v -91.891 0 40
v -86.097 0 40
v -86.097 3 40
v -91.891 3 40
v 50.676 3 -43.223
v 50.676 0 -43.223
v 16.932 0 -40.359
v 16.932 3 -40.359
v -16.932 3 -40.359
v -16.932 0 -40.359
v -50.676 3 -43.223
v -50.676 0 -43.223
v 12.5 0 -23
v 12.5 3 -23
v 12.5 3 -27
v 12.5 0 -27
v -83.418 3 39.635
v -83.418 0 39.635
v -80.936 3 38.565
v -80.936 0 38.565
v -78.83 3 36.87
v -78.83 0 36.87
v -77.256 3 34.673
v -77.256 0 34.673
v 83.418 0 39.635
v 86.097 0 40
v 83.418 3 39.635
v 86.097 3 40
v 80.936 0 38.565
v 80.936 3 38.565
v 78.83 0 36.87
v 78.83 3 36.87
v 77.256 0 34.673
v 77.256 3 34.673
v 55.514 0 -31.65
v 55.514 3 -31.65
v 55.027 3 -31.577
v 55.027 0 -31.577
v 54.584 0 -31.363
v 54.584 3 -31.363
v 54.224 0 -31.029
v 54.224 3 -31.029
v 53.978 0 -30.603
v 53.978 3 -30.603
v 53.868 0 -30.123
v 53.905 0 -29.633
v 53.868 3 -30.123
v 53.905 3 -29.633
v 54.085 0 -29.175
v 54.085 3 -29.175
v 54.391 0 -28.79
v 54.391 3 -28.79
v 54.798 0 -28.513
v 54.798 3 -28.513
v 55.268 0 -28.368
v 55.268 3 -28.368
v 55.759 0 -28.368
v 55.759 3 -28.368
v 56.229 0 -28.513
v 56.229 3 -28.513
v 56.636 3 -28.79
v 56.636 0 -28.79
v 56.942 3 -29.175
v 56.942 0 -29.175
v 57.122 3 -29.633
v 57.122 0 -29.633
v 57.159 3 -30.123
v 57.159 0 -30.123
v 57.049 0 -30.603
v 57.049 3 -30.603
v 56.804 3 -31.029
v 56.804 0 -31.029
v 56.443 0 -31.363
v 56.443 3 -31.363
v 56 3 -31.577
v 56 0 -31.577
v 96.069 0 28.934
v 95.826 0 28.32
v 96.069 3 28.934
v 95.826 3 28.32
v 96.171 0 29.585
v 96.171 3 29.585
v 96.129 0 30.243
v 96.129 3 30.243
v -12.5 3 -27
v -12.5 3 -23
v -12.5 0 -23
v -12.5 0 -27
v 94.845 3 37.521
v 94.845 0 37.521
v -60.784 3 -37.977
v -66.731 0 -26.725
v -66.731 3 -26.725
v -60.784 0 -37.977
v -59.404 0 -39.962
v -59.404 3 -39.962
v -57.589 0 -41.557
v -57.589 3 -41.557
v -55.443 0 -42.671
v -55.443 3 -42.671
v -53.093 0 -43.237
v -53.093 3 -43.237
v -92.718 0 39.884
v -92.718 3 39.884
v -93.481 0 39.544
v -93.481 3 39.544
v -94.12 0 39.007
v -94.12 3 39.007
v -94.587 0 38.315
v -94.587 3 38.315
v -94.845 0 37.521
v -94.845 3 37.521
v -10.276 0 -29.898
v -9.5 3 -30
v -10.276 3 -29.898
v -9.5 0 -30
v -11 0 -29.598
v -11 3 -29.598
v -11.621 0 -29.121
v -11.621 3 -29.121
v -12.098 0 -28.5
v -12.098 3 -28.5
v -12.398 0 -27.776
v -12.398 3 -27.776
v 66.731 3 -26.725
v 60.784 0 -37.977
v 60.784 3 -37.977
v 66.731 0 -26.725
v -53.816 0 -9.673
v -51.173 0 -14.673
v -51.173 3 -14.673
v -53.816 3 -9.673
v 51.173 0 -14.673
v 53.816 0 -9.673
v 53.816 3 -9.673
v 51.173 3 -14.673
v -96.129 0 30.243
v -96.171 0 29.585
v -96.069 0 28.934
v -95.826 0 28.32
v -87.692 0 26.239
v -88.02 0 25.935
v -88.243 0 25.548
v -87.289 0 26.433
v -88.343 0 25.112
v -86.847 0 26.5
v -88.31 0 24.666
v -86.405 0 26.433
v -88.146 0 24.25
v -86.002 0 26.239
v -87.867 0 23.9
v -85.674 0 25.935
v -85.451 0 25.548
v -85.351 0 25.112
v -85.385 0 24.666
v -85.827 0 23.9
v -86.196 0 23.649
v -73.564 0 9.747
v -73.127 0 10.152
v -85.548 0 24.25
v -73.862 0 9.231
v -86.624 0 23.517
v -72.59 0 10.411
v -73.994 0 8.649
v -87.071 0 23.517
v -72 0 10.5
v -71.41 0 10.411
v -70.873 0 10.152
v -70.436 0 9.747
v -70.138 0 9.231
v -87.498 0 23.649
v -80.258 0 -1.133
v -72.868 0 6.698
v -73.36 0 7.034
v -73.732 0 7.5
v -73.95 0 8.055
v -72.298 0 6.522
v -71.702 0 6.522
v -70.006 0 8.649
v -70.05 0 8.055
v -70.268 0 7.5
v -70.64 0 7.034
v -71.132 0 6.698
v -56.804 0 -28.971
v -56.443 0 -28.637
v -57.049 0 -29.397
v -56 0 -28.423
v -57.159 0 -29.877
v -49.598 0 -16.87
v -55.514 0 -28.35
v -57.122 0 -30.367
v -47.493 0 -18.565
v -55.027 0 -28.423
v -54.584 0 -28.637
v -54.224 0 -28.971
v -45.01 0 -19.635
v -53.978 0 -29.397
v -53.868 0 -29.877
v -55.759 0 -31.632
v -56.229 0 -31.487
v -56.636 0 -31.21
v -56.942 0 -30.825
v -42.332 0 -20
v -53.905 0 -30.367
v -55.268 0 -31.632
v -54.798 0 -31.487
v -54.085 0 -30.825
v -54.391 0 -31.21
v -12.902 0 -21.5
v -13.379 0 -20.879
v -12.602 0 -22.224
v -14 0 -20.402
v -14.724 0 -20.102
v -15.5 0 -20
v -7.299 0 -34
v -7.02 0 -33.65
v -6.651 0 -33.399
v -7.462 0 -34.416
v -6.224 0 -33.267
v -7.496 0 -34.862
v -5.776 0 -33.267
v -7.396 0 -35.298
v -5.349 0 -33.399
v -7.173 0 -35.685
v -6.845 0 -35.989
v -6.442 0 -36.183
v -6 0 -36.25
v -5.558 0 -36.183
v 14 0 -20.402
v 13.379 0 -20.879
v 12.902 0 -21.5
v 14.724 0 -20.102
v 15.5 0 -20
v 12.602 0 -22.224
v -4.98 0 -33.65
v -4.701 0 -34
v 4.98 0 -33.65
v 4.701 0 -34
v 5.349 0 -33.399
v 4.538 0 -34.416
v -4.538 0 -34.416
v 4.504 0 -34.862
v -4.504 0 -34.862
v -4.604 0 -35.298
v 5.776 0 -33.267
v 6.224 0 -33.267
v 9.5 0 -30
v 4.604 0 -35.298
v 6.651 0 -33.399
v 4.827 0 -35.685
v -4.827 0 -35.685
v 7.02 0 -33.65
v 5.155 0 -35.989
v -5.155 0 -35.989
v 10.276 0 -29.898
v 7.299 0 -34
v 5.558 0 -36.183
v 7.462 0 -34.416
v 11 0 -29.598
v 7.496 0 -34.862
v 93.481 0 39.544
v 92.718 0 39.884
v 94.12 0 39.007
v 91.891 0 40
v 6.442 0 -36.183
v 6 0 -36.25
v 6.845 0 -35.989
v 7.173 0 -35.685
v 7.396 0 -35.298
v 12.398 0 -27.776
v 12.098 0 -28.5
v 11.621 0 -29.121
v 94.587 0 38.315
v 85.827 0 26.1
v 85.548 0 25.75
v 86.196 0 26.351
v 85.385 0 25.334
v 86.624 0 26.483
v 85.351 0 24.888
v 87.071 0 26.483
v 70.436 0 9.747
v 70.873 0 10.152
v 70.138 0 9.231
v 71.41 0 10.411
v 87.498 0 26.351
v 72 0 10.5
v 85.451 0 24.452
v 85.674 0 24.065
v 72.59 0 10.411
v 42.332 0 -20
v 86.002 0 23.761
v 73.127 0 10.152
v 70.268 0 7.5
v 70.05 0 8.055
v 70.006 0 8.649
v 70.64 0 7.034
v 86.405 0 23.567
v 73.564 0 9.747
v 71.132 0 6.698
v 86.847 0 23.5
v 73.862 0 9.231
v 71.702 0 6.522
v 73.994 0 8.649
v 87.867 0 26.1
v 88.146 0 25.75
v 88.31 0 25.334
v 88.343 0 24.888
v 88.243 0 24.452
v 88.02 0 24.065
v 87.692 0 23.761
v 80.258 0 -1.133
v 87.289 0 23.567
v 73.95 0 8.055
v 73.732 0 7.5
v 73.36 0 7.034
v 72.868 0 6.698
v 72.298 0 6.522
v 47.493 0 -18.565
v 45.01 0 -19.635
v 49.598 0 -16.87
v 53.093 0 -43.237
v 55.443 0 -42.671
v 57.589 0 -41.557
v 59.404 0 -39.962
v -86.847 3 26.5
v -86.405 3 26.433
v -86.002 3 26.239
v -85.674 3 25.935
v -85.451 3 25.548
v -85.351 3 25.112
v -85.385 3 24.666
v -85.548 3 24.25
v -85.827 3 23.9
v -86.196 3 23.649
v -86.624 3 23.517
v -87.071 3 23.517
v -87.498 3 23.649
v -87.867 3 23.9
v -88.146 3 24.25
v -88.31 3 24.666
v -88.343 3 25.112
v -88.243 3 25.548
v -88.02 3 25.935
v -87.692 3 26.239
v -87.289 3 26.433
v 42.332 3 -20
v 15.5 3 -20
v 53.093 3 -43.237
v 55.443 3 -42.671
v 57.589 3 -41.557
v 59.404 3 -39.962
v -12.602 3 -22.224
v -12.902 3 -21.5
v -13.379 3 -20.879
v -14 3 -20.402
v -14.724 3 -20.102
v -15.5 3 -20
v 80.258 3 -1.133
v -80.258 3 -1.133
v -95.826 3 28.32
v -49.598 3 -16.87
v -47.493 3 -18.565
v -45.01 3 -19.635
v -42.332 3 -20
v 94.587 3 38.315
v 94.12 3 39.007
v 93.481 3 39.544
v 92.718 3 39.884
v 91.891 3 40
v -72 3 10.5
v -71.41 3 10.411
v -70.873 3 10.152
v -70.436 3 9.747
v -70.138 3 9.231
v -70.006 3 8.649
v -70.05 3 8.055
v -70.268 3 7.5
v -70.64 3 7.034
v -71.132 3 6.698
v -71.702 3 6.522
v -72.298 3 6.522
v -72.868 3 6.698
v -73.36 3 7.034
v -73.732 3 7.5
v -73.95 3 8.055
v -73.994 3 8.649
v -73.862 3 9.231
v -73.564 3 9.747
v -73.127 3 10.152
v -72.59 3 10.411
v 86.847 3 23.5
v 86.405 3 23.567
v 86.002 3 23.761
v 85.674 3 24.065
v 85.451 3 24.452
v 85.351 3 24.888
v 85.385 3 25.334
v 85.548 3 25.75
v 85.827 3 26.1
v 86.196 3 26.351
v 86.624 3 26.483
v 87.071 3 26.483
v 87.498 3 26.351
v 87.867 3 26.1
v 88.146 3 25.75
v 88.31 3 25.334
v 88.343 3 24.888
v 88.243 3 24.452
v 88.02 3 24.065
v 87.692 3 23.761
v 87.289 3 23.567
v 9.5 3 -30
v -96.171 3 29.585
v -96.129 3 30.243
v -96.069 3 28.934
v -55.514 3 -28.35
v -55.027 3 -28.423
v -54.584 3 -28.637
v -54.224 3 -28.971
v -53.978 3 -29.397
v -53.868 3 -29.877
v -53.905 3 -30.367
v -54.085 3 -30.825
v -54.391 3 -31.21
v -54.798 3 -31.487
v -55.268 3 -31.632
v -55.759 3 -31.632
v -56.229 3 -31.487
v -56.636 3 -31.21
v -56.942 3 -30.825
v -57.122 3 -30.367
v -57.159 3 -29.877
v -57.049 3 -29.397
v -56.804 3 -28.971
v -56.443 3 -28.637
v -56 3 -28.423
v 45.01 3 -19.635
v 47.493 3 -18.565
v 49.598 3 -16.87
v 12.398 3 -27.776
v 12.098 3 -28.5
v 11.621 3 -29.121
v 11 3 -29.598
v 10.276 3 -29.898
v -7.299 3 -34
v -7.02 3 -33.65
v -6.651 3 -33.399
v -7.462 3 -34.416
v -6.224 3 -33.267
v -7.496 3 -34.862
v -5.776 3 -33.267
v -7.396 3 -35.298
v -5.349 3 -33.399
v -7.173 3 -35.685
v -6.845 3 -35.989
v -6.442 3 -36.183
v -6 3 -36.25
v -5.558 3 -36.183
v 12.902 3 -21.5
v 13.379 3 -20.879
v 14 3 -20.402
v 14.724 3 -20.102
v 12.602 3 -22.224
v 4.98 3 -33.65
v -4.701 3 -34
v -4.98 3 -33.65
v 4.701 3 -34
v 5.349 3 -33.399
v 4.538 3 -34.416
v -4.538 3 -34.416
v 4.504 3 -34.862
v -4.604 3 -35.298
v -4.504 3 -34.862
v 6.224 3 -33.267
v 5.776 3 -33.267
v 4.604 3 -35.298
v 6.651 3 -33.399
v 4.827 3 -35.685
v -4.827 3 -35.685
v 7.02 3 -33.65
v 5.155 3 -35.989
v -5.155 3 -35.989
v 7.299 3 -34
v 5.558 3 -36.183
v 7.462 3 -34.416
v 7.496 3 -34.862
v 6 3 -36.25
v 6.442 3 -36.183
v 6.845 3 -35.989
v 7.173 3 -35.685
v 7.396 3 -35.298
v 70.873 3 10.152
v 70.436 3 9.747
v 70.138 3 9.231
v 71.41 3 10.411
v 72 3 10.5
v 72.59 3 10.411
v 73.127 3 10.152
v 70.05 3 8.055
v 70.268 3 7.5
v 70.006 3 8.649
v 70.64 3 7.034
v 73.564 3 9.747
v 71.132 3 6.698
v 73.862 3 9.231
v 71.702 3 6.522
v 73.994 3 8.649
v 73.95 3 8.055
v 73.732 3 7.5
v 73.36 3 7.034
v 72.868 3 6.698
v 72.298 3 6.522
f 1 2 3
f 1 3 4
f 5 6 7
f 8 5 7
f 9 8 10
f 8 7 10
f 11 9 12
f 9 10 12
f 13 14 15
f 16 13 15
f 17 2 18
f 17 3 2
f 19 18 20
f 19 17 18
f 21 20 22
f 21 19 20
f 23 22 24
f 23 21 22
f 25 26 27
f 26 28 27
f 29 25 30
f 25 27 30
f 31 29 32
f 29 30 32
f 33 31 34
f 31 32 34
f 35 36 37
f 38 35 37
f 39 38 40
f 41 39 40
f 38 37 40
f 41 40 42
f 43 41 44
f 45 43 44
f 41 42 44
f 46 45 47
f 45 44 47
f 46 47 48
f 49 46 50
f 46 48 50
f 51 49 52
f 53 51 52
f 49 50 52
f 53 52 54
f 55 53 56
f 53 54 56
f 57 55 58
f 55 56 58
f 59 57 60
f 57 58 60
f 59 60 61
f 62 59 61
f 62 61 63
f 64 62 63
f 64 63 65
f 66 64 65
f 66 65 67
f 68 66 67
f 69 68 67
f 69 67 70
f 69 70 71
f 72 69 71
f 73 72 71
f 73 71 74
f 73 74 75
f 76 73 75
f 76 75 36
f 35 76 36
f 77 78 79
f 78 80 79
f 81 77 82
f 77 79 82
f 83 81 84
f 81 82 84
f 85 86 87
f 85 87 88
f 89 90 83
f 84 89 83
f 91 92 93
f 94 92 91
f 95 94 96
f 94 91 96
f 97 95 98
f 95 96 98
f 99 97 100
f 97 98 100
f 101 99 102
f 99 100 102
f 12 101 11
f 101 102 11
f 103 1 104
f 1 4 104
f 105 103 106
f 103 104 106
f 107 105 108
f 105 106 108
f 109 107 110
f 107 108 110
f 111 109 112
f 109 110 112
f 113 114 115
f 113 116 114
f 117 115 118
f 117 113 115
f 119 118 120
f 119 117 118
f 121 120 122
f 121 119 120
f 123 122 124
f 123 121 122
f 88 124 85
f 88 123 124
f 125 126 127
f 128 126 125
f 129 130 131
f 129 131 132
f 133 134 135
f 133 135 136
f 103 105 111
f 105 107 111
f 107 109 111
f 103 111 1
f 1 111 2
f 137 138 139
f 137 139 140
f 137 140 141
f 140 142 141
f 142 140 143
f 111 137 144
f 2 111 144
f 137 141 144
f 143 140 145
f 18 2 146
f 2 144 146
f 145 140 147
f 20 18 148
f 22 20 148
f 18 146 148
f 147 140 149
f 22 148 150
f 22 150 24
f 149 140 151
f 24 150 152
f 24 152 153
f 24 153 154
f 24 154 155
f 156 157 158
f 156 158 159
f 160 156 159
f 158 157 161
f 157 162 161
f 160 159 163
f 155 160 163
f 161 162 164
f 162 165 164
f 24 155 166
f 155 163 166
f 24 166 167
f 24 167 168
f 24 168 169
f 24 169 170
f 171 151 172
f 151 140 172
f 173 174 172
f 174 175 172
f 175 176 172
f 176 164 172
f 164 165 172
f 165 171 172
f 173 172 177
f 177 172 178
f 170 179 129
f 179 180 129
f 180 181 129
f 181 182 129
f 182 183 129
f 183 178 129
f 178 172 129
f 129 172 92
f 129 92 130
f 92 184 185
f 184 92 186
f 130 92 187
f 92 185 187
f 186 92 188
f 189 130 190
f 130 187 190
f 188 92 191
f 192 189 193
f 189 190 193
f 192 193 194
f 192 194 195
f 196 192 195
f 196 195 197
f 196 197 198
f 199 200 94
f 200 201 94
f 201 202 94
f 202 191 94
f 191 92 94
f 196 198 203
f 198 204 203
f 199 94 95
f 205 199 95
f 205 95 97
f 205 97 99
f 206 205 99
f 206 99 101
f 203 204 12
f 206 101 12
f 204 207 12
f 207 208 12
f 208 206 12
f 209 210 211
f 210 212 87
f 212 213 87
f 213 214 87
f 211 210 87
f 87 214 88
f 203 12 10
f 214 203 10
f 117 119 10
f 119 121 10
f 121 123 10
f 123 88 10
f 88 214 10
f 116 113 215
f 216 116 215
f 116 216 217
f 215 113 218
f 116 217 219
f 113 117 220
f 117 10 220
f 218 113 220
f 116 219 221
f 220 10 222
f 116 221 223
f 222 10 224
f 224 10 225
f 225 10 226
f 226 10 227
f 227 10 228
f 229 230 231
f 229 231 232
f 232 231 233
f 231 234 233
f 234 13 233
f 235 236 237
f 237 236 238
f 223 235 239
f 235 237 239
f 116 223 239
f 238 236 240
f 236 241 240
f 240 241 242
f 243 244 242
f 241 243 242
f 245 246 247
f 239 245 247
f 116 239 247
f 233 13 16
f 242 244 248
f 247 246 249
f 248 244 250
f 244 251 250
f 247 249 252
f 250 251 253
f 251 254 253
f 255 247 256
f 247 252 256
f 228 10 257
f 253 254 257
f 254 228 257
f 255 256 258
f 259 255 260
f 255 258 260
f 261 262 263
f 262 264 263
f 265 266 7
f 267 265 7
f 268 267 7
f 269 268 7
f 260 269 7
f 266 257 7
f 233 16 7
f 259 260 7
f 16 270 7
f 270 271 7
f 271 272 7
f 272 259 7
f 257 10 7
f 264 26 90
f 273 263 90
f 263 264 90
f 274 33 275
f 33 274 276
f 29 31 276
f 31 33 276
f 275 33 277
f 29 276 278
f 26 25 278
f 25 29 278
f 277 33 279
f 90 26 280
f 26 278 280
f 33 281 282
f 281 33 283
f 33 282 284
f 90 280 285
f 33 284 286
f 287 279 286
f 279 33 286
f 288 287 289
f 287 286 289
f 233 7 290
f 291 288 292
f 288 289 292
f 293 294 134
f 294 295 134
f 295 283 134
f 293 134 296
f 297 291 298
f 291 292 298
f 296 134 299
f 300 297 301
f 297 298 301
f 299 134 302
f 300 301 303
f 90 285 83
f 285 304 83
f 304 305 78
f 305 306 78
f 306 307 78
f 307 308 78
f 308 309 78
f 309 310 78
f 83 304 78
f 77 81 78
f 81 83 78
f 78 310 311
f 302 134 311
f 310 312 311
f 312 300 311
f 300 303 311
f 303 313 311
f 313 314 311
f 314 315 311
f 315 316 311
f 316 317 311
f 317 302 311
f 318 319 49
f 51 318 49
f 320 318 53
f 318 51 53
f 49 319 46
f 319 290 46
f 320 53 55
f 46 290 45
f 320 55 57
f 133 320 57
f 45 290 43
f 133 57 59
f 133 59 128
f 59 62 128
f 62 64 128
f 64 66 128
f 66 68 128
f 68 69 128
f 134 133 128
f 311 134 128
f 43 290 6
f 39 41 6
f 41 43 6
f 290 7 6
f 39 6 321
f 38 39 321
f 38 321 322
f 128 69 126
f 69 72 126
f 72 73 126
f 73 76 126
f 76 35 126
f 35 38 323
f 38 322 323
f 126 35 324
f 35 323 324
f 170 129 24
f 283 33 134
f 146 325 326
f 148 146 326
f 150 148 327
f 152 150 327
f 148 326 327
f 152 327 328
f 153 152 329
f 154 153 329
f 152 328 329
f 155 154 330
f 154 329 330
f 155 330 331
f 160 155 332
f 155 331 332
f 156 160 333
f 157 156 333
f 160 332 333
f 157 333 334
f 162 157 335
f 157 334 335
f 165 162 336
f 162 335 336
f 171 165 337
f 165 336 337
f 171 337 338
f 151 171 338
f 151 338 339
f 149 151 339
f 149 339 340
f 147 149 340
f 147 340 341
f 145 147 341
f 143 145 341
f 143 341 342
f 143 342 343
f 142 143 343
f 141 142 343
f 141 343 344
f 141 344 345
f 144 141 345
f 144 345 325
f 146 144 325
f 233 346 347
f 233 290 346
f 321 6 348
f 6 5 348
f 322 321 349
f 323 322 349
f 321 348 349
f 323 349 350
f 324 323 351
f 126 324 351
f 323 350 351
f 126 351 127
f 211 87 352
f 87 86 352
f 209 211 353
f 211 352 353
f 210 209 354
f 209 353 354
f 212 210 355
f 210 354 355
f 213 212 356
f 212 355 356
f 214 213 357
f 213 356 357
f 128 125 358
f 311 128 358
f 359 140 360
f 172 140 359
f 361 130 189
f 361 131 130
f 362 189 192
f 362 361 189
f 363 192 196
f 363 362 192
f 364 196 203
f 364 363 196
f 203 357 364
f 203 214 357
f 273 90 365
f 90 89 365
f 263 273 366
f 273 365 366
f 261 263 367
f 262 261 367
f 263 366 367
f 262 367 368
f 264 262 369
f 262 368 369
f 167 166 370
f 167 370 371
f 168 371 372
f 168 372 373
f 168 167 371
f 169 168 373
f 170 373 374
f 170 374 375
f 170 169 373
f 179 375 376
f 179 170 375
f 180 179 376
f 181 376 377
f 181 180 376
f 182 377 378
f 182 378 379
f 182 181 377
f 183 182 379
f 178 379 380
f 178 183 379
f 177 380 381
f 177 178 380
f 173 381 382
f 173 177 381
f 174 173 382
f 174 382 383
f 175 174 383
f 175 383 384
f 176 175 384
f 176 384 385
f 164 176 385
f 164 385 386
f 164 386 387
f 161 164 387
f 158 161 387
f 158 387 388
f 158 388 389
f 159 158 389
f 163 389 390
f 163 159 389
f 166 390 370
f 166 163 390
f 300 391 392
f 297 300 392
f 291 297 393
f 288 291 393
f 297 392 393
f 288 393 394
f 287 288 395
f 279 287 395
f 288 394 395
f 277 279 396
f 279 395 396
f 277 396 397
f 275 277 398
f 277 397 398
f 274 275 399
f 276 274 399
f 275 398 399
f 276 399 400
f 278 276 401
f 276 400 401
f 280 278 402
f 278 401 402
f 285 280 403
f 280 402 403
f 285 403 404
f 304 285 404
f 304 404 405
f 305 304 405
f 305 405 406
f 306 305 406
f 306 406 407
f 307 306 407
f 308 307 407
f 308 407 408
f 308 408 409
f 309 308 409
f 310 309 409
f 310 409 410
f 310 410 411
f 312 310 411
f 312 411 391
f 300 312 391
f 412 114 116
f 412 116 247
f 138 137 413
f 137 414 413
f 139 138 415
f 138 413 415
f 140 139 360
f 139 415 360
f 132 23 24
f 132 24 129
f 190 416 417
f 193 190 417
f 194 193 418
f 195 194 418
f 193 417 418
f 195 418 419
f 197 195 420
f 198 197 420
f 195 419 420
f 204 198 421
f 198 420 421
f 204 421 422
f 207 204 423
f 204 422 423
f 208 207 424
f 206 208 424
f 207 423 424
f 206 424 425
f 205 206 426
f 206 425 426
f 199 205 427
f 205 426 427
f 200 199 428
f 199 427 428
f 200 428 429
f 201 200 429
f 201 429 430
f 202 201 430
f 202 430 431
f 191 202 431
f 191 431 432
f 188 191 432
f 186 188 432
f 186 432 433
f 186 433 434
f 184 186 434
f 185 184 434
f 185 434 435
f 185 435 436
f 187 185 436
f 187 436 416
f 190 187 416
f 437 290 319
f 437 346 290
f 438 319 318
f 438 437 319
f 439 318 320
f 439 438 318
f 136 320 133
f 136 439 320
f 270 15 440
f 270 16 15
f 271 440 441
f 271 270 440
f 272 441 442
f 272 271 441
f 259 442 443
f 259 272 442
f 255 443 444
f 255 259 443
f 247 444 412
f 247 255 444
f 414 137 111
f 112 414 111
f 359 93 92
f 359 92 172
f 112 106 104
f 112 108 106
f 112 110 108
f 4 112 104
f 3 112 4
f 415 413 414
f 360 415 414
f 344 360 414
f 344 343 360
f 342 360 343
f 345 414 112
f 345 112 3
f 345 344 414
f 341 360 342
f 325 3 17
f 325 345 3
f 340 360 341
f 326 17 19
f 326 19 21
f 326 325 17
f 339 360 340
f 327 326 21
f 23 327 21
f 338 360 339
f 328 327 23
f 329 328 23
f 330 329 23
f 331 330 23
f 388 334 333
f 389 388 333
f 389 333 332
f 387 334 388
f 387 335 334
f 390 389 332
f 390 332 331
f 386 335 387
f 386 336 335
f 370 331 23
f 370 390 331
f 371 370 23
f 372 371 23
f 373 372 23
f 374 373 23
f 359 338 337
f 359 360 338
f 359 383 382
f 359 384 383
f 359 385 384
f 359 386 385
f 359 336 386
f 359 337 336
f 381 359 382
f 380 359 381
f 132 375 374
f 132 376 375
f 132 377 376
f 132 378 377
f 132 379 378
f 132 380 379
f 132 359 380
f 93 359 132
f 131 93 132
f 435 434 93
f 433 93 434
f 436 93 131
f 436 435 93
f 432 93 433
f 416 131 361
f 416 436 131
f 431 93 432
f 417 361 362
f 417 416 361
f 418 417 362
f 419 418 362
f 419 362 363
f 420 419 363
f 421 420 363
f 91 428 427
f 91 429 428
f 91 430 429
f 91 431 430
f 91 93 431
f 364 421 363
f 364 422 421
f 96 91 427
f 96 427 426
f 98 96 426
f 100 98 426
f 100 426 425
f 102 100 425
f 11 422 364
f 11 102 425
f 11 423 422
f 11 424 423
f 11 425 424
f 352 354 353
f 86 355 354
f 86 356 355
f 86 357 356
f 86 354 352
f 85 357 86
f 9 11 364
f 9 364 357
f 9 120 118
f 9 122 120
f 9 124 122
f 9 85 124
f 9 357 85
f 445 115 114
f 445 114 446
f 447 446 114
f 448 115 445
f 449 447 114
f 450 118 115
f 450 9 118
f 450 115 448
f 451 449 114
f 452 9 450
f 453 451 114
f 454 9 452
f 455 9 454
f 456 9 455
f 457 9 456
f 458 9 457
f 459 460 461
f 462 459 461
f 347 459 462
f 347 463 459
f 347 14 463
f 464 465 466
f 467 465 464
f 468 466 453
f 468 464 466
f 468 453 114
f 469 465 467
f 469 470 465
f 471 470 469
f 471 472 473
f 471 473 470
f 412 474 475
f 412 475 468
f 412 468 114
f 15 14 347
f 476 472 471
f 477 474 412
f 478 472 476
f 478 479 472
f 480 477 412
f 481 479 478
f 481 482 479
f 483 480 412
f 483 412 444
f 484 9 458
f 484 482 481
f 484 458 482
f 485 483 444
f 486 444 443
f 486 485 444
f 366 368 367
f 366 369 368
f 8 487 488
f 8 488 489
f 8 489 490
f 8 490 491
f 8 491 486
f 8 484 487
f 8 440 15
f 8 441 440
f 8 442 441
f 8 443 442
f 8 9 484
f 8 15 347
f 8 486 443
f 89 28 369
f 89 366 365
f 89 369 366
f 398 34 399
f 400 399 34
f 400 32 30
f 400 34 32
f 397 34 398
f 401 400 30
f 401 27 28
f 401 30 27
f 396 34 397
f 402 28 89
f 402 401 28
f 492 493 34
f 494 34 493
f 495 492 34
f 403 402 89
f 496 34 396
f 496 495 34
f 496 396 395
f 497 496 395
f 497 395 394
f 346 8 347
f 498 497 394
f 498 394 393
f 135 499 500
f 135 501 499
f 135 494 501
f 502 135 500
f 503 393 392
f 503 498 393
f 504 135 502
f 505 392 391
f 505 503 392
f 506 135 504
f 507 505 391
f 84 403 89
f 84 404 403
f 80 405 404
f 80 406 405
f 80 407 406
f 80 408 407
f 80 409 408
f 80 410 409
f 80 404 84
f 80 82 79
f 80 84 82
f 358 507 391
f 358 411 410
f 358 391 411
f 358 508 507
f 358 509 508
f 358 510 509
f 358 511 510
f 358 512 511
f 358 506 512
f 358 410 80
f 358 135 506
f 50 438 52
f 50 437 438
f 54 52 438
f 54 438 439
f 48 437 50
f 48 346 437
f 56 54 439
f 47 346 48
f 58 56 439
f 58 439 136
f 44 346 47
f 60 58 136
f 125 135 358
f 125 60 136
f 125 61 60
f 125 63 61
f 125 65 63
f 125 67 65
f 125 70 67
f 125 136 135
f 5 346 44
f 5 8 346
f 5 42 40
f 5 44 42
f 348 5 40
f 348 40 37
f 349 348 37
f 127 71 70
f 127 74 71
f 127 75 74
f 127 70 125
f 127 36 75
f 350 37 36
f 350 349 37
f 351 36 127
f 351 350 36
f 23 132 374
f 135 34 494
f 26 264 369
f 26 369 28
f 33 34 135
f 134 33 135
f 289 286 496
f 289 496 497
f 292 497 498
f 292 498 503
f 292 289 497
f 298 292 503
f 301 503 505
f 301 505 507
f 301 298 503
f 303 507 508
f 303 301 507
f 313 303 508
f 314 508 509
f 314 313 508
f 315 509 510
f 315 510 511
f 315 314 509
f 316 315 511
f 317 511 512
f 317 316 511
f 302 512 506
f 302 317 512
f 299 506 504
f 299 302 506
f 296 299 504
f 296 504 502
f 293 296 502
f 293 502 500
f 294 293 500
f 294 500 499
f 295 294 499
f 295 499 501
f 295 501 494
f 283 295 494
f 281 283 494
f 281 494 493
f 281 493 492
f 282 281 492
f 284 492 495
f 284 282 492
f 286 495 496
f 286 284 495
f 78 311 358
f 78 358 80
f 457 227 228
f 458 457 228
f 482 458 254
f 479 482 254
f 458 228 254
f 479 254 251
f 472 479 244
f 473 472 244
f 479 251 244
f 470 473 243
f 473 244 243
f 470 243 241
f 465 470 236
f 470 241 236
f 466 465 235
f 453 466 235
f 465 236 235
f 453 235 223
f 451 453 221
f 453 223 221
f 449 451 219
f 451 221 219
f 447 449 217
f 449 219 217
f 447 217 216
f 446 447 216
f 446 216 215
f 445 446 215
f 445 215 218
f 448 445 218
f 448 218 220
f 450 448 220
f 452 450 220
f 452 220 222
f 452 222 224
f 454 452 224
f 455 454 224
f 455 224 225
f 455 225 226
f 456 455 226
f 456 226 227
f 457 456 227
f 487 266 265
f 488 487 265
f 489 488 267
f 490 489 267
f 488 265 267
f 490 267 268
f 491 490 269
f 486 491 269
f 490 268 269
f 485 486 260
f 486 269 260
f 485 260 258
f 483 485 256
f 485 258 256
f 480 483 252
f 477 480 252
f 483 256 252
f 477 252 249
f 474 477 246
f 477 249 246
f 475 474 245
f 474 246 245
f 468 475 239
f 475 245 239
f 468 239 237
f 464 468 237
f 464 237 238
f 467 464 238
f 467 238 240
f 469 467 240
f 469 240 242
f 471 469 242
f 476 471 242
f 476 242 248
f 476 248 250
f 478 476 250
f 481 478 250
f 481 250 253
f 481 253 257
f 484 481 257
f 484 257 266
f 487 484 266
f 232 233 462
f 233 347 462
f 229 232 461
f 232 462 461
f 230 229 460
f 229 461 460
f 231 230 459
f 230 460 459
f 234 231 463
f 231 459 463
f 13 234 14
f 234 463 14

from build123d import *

# Parameters (mm, degrees)
SKETCH_1_R          = 2
EXTRUDE_1_DEPTH     = 3
SKETCH_2_R          = 1.5
CUT_EXTRUDE_1_DEPTH = 129.924848176
CUT_EXTRUDE_2_DEPTH = 3
CUT_EXTRUDE_3_DEPTH = 3
CUT_EXTRUDE_4_DEPTH = 129.924848176
FILLET_1_R          = 10
SKETCH_6_R          = 1.25
CUT_EXTRUDE_5_DEPTH = 3
FILLET_2_R          = 10
FILLET_3_R          = 10
CUT_EXTRUDE_6_DEPTH = 127.707867559
FILLET_4_R          = 3
CUT_EXTRUDE_START   = -10
SKETCH_8_R          = 1.25
CUT_EXTRUDE_7_DEPTH = 10
SKETCH_9_R          = 1.65
SKETCH_9_R_2        = 1.5
CUT_EXTRUDE_8_DEPTH = 106.990151571
FILLET_5_R          = 10
SKETCH_10_W         = 25
SKETCH_10_H         = 20
CUT_EXTRUDE_9_DEPTH = 106.637525121
FILLET_6_R          = 3


with BuildPart() as part:
    # 草图1 → 凸台-拉伸1 (new body)
    # profile 1 of 3: a face of its own
    with BuildSketch(Plane(origin=(0, 0, 0), x_dir=(1, 0, 0), z_dir=(0, 1, 0))):
        with BuildLine():
            ThreePointArc((90, 50.256494602), (0, 40), (-90, 50.256494602))
            Line((-90, 50.256494602), (-90, -65))
            Line((-90, -65), (90, -65))
            Line((90, -65), (90, 50.256494602))
        make_face()
        with Locations(Location((-72, -8.5, 0), (0, 0, 270))):
            Circle(SKETCH_1_R, mode=Mode.SUBTRACT)
        with Locations(Location((72, -8.5, 0), (0, 0, 270))):
            Circle(SKETCH_1_R, mode=Mode.SUBTRACT)
    # profile 2 of 3: a face of its own
    with BuildSketch(Plane(origin=(0, 0, 0), x_dir=(1, 0, 0), z_dir=(0, 1, 0))):
        with BuildLine():
            Line((-90, -65), (-90, 50.256494602))
            ThreePointArc((-90, 50.256494602), (-100.687943549, 52.879943656), (-111.299669708, 55.796429581))
            Line((-111.299669708, 55.796429581), (-90, -65))
        make_face()
    # profile 3 of 3: a face of its own
    with BuildSketch(Plane(origin=(0, 0, 0), x_dir=(1, 0, 0), z_dir=(0, 1, 0))):
        with BuildLine():
            ThreePointArc((111.299669708, 55.796429581), (100.687943549, 52.879943656), (90, 50.256494602))
            Line((90, 50.256494602), (90, -65))
            Line((90, -65), (111.299669708, 55.796429581))
        make_face()
    extrude(amount=EXTRUDE_1_DEPTH)

    # 草图2 → 切除-拉伸1 (cut, through all)
    with BuildSketch(Plane(origin=(0, 0, 0), x_dir=(-1, 0, 0), z_dir=(0, -1, 0))):
        with Locations(Location((6, 28.25, 0), (0, 0, 90))):
            Circle(SKETCH_2_R)
        with Locations(Location((-6, 28.25, 0), (0, 0, 90))):
            Circle(SKETCH_2_R)
        with Locations(Location((6, 34.75, 0), (0, 0, 90))):
            Circle(SKETCH_2_R)
        with Locations(Location((-6, 34.75, 0), (0, 0, 90))):
            Circle(SKETCH_2_R)
    extrude(amount=-CUT_EXTRUDE_1_DEPTH, mode=Mode.SUBTRACT)

    # 草图3 → 切除-拉伸2 (cut)
    with BuildSketch(Plane(origin=(0, 3, 0), x_dir=(1, 0, 0), z_dir=(0, 1, 0))):
        with BuildLine():
            ThreePointArc((-45, -46.5), (-40, -41.5), (-35, -46.5))
            Line((-35, -46.5), (-35, 8.5))
            ThreePointArc((-35, 8.5), (-40, 3.5), (-45, 8.5))
            Line((-45, 8.5), (-45, -46.5))
        make_face()
        with BuildLine():
            ThreePointArc((-45, 8.5), (-40, 3.5), (-35, 8.5))
            Line((-35, 8.5), (-45, 8.5))
        make_face()
        with BuildLine():
            Line((-45, 8.5), (-35, 8.5))
            ThreePointArc((-35, 8.5), (-40, 13.5), (-45, 8.5))
        make_face()
        with BuildLine():
            ThreePointArc((-45, -46.5), (-40, -51.5), (-35, -46.5))
            Line((-35, -46.5), (-45, -46.5))
        make_face()
        with BuildLine():
            Line((-45, -46.5), (-35, -46.5))
            ThreePointArc((-35, -46.5), (-40, -41.5), (-45, -46.5))
        make_face()
        with BuildLine():
            ThreePointArc((45, 8.5), (40, 3.5), (35, 8.5))
            Line((35, 8.5), (35, -46.5))
            ThreePointArc((35, -46.5), (40, -41.5), (45, -46.5))
            Line((45, -46.5), (45, 8.5))
        make_face()
        with BuildLine():
            ThreePointArc((45, -46.5), (40, -41.5), (35, -46.5))
            Line((35, -46.5), (45, -46.5))
        make_face()
        with BuildLine():
            Line((45, -46.5), (35, -46.5))
            ThreePointArc((35, -46.5), (40, -51.5), (45, -46.5))
        make_face()
        with BuildLine():
            ThreePointArc((45, 8.5), (40, 13.5), (35, 8.5))
            Line((35, 8.5), (45, 8.5))
        make_face()
        with BuildLine():
            Line((45, 8.5), (35, 8.5))
            ThreePointArc((35, 8.5), (40, 3.5), (45, 8.5))
        make_face()
    extrude(amount=-CUT_EXTRUDE_2_DEPTH, mode=Mode.SUBTRACT)

    # 草图4 → 切除-拉伸3 (cut)
    with BuildSketch(Plane(origin=(0, 3, 0), x_dir=(1, 0, 0), z_dir=(0, 1, 0))):
        with BuildLine():
            Line((45, -41.966401061), (45, -27.473665961))
            ThreePointArc((45, -27.473665961), (39.285969894, -12.835001066), (40.990143514, 2.78666473))
            Line((40.990143514, 2.78666473), (35, 4.966898668))
            Line((35, 4.966898668), (35, -30.4089023))
            ThreePointArc((35, -30.4089023), (39.482405618, -36.635494586), (45, -41.966401061))
        make_face()
        with BuildLine():
            Line((35, 4.966898668), (31.593217306, 6.206866163))
            ThreePointArc((31.593217306, 6.206866163), (29.1849194, -12.483575431), (35, -30.4089023))
            Line((35, -30.4089023), (35, 4.966898668))
        make_face()
        with BuildLine():
            Line((72, -51.5), (72, -41.5))
            ThreePointArc((72, -41.5), (56.787028178, -37.784219101), (45, -27.473665961))
            Line((45, -27.473665961), (45, -41.966401061))
            ThreePointArc((45, -41.966401061), (57.6831436, -49.046610497), (72, -51.5))
        make_face()
    extrude(amount=-CUT_EXTRUDE_3_DEPTH, mode=Mode.SUBTRACT)

    # 草图5 → 切除-拉伸4 (cut, through all)
    with BuildSketch(Plane(origin=(0, 3, 0), x_dir=(1, 0, 0), z_dir=(0, 1, 0))):
        Polygon((23, 15), (23, -55), (88, -55), (51, 15), align=None)
        Polygon((-88, -55), (-51, 15), (-23, 15), (-23, -55), align=None)
    extrude(amount=-CUT_EXTRUDE_4_DEPTH, mode=Mode.SUBTRACT)

    # 圆角1
    fillet_1_edges = [part.edges().sort_by_distance(p)[0] for p in [
        (23, 1.5, -15),
        (51, 1.5, -15),
        (88, 1.5, 55),
        (23, 1.5, 55),
        (-23, 1.5, 55),
        (-88, 1.5, 55),
        (-51, 1.5, -15),
        (-23, 1.5, -15),
    ]]
    fillet(fillet_1_edges, radius=FILLET_1_R)

    # 草图6 → 切除-拉伸5 (cut)
    with BuildSketch(Plane(origin=(0, 3, 0), x_dir=(1, 0, 0), z_dir=(0, 1, 0))):
        with Locations(Location((0, -59, 0), (0, 0, 270))):
            Circle(SKETCH_6_R)
        with Locations(Location((0, -51.5, 0), (0, 0, 270))):
            Circle(SKETCH_6_R)
        with Locations(Location((0, -44, 0), (0, 0, 270))):
            Circle(SKETCH_6_R)
        with Locations(Location((0, -36.5, 0), (0, 0, 270))):
            Circle(SKETCH_6_R)
        with Locations(Location((0, -29, 0), (0, 0, 270))):
            Circle(SKETCH_6_R)
        with Locations(Location((0, -21.5, 0), (0, 0, 270))):
            Circle(SKETCH_6_R)
        with Locations(Location((0, -14, 0), (0, 0, 270))):
            Circle(SKETCH_6_R)
        with Locations(Location((0, -6.5, 0), (0, 0, 270))):
            Circle(SKETCH_6_R)
        with Locations(Location((0, 1, 0), (0, 0, 270))):
            Circle(SKETCH_6_R)
        with Locations(Location((0, 8.5, 0), (0, 0, 270))):
            Circle(SKETCH_6_R)
        with Locations(Location((0, 16, 0), (0, 0, 270))):
            Circle(SKETCH_6_R)
    extrude(amount=-CUT_EXTRUDE_5_DEPTH, mode=Mode.SUBTRACT)

    # 圆角2
    fillet_2_edges = [part.edges().sort_by_distance(p)[0] for p in [
        (90, 1.5, 65),
        (-90, 1.5, 65),
    ]]
    fillet(fillet_2_edges, radius=FILLET_2_R)

    # 圆角3
    fillet_3_edges = [part.edges().sort_by_distance(p)[0] for p in [
        (111.299669708, 1.5, -55.796429581),
        (-111.299669708, 1.5, -55.796429581),
    ]]
    fillet(fillet_3_edges, radius=FILLET_3_R)

    # 草图7 → 切除-拉伸6 (cut, through all)
    with BuildSketch(Plane(origin=(0, 3, 0), x_dir=(1, 0, 0), z_dir=(0, 1, 0))):
        Polygon((-65, 30), (-84.345864805, -6.600284766), (-92.1600328, 37.716064119), align=None)
        Polygon((84.345864805, -6.600284766), (92.1600328, 37.716064119), (65, 30), align=None)
    extrude(amount=-CUT_EXTRUDE_6_DEPTH, mode=Mode.SUBTRACT)

    # 圆角4
    fillet_4_edges = [part.edges().sort_by_distance(p)[0] for p in [
        (-92.1600328, 1.5, -37.716064119),
        (-65, 1.5, -30),
        (-84.345864805, 1.5, 6.600284766),
        (84.345864805, 1.5, 6.600284766),
        (65, 1.5, -30),
        (92.1600328, 1.5, -37.716064119),
    ]]
    fillet(fillet_4_edges, radius=FILLET_4_R)

    # 草图8 → 切除-拉伸7 (cut)
    # profile 1 of 3: a face of its own
    with BuildSketch(Plane(origin=(0, 3, 0), x_dir=(1, 0, 0), z_dir=(0, 1, 0)).offset(CUT_EXTRUDE_START)):
        with BuildLine():
            Line((-96.307233514, -29.229901242), (-80.258130563, 1.133266502))
            ThreePointArc((-80.258130563, 1.133266502), (-83.376089329, -0.428449113), (-85.864838643, 2.014243946))
            Line((-85.864838643, 2.014243946), (-91.328614944, 33.00085915))
            ThreePointArc((-91.328614944, 33.00085915), (-90.384312562, 35.748777877), (-87.554346089, 36.407605686))
            Line((-87.554346089, 36.407605686), (-68.563668687, 31.012424996))
            ThreePointArc((-68.563668687, 31.012424996), (-66.62487936, 29.305577344), (-66.731229463, 26.724701016))
            Line((-66.731229463, 26.724701016), (-57.517083989, 44.156868129))
            ThreePointArc((-57.517083989, 44.156868129), (-77.01064871, 47.483299737), (-96.315987752, 51.76910156))
            ThreePointArc((-96.315987752, 51.76910156), (-105.548135175, 49.372887426), (-108.571964976, 40.326847323))
            Line((-108.571964976, 40.326847323), (-96.307233514, -29.229901242))
        make_face()
    # profile 2 of 3: a face of its own
    with BuildSketch(Plane(origin=(0, 3, 0), x_dir=(1, 0, 0), z_dir=(0, 1, 0)).offset(CUT_EXTRUDE_START)):
        with BuildLine():
            Line((-80.071428571, -40), (-94.408174518, -40))
            Line((-94.408174518, -40), (-91.457081218, -56.736481777))
            ThreePointArc((-91.457081218, -56.736481777), (-88.036879785, -62.660444431), (-81.609003688, -65))
            Line((-81.609003688, -65), (81.609003688, -65))
            ThreePointArc((81.609003688, -65), (88.036879785, -62.660444431), (91.457081218, -56.736481777))
            Line((91.457081218, -56.736481777), (94.408174518, -40))
            Line((94.408174518, -40), (80.071428571, -40))
            Line((80.071428571, -40), (80.244232708, -40.326926744))
            ThreePointArc((80.244232708, -40.326926744), (79.968641807, -50.160875286), (71.403283305, -55))
            Line((71.403283305, -55), (33, -55))
            ThreePointArc((33, -55), (25.928932188, -52.071067812), (23, -45))
            Line((23, -45), (23, 5))
            ThreePointArc((23, 5), (25.928932188, 12.071067812), (33, 15))
            Line((33, 15), (44.974711876, 15))
            ThreePointArc((44.974711876, 15), (50.135587162, 13.565358503), (53.815661279, 9.673073256))
            Line((53.815661279, 9.673073256), (48.357142857, 20))
            Line((48.357142857, 20), (-48.357142857, 20))
            Line((-48.357142857, 20), (-53.815661279, 9.673073256))
            ThreePointArc((-53.815661279, 9.673073256), (-50.135587162, 13.565358503), (-44.974711876, 15))
            Line((-44.974711876, 15), (-33, 15))
            ThreePointArc((-33, 15), (-25.928932188, 12.071067812), (-23, 5))
            Line((-23, 5), (-23, -45))
            ThreePointArc((-23, -45), (-25.928932188, -52.071067812), (-33, -55))
            Line((-33, -55), (-71.403283305, -55))
            ThreePointArc((-71.403283305, -55), (-79.968641807, -50.160875286), (-80.244232708, -40.326926744))
            Line((-80.244232708, -40.326926744), (-80.071428571, -40))
        make_face()
        with Locations((0, -59)):
            Circle(SKETCH_8_R, mode=Mode.SUBTRACT)
        with Locations((0, -51.5)):
            Circle(SKETCH_8_R, mode=Mode.SUBTRACT)
        with Locations((0, -44)):
            Circle(SKETCH_8_R, mode=Mode.SUBTRACT)
        with Locations((0, -36.5)):
            Circle(SKETCH_8_R, mode=Mode.SUBTRACT)
        with Locations((0, -29)):
            Circle(SKETCH_8_R, mode=Mode.SUBTRACT)
        with Locations((0, -21.5)):
            Circle(SKETCH_8_R, mode=Mode.SUBTRACT)
        with Locations((0, -14)):
            Circle(SKETCH_8_R, mode=Mode.SUBTRACT)
        with Locations((0, -6.5)):
            Circle(SKETCH_8_R, mode=Mode.SUBTRACT)
        with Locations((0, 1)):
            Circle(SKETCH_8_R, mode=Mode.SUBTRACT)
        with Locations((0, 8.5)):
            Circle(SKETCH_8_R, mode=Mode.SUBTRACT)
        with Locations((0, 16)):
            Circle(SKETCH_8_R, mode=Mode.SUBTRACT)
    # profile 3 of 3: a face of its own
    with BuildSketch(Plane(origin=(0, 3, 0), x_dir=(1, 0, 0), z_dir=(0, 1, 0)).offset(CUT_EXTRUDE_START)):
        with BuildLine():
            ThreePointArc((96.315987752, 51.76910156), (77.01064871, 47.483299737), (57.517083989, 44.156868129))
            Line((57.517083989, 44.156868129), (66.731229463, 26.724701016))
            ThreePointArc((66.731229463, 26.724701016), (66.62487936, 29.305577344), (68.563668687, 31.012424996))
            Line((68.563668687, 31.012424996), (87.554346089, 36.407605686))
            ThreePointArc((87.554346089, 36.407605686), (90.384312562, 35.748777877), (91.328614944, 33.00085915))
            Line((91.328614944, 33.00085915), (85.864838643, 2.014243946))
            ThreePointArc((85.864838643, 2.014243946), (83.376089329, -0.428449113), (80.258130563, 1.133266502))
            Line((80.258130563, 1.133266502), (96.307233514, -29.229901242))
            Line((96.307233514, -29.229901242), (108.571964976, 40.326847323))
            ThreePointArc((108.571964976, 40.326847323), (105.548135175, 49.372887426), (96.315987752, 51.76910156))
        make_face()
    extrude(amount=CUT_EXTRUDE_7_DEPTH, mode=Mode.SUBTRACT)

    # 草图9 → 切除-拉伸8 (cut, through all)
    with BuildSketch(Plane(origin=(0, 3, 0), x_dir=(1, 0, 0), z_dir=(0, 1, 0))):
        with Locations(Location((-55.513531222, 30, 0), (0, 0, 270))):
            Circle(SKETCH_9_R)
        with Locations(Location((-86.847160275, -25, 0), (0, 0, 270))):
            Circle(SKETCH_9_R_2)
        with Locations(Location((86.847160275, -25, 0), (0, 0, 90))):
            Circle(SKETCH_9_R_2)
        with Locations(Location((55.513531222, 30, 0), (0, 0, 90))):
            Circle(SKETCH_9_R)
    extrude(amount=-CUT_EXTRUDE_8_DEPTH, mode=Mode.SUBTRACT)

    # 圆角5
    fillet_5_edges = [part.edges().sort_by_distance(p)[0] for p in [
        (-48.357142857, 1.5, -20),
        (80.071428571, 1.5, 40),
        (48.357142857, 1.5, -20),
        (-80.071428571, 1.5, 40),
        (57.517083989, 1.5, -44.156868129),
        (-57.517083989, 1.5, -44.156868129),
    ]]
    fillet(fillet_5_edges, radius=FILLET_5_R)

    # 草图10 → 切除-拉伸9 (cut, through all)
    with BuildSketch(Plane(origin=(0, 3, 0), x_dir=(1, 0, 0), z_dir=(0, 1, 0))):
        with Locations((0, 20)):
            Rectangle(SKETCH_10_W, SKETCH_10_H)
    extrude(amount=-CUT_EXTRUDE_9_DEPTH, mode=Mode.SUBTRACT)

    # 圆角6
    fillet_6_edges = [part.edges().sort_by_distance(p)[0] for p in [
        (-94.408174518, 1.5, 40),
        (94.408174518, 1.5, 40),
        (-96.307233514, 1.5, 29.229901242),
        (96.307233514, 1.5, 29.229901242),
        (-12.5, 1.5, -20),
        (12.5, 1.5, -20),
        (12.5, 1.5, -30),
        (-12.5, 1.5, -30),
    ]]
    fillet(fillet_6_edges, radius=FILLET_6_R)


solid = part.part
